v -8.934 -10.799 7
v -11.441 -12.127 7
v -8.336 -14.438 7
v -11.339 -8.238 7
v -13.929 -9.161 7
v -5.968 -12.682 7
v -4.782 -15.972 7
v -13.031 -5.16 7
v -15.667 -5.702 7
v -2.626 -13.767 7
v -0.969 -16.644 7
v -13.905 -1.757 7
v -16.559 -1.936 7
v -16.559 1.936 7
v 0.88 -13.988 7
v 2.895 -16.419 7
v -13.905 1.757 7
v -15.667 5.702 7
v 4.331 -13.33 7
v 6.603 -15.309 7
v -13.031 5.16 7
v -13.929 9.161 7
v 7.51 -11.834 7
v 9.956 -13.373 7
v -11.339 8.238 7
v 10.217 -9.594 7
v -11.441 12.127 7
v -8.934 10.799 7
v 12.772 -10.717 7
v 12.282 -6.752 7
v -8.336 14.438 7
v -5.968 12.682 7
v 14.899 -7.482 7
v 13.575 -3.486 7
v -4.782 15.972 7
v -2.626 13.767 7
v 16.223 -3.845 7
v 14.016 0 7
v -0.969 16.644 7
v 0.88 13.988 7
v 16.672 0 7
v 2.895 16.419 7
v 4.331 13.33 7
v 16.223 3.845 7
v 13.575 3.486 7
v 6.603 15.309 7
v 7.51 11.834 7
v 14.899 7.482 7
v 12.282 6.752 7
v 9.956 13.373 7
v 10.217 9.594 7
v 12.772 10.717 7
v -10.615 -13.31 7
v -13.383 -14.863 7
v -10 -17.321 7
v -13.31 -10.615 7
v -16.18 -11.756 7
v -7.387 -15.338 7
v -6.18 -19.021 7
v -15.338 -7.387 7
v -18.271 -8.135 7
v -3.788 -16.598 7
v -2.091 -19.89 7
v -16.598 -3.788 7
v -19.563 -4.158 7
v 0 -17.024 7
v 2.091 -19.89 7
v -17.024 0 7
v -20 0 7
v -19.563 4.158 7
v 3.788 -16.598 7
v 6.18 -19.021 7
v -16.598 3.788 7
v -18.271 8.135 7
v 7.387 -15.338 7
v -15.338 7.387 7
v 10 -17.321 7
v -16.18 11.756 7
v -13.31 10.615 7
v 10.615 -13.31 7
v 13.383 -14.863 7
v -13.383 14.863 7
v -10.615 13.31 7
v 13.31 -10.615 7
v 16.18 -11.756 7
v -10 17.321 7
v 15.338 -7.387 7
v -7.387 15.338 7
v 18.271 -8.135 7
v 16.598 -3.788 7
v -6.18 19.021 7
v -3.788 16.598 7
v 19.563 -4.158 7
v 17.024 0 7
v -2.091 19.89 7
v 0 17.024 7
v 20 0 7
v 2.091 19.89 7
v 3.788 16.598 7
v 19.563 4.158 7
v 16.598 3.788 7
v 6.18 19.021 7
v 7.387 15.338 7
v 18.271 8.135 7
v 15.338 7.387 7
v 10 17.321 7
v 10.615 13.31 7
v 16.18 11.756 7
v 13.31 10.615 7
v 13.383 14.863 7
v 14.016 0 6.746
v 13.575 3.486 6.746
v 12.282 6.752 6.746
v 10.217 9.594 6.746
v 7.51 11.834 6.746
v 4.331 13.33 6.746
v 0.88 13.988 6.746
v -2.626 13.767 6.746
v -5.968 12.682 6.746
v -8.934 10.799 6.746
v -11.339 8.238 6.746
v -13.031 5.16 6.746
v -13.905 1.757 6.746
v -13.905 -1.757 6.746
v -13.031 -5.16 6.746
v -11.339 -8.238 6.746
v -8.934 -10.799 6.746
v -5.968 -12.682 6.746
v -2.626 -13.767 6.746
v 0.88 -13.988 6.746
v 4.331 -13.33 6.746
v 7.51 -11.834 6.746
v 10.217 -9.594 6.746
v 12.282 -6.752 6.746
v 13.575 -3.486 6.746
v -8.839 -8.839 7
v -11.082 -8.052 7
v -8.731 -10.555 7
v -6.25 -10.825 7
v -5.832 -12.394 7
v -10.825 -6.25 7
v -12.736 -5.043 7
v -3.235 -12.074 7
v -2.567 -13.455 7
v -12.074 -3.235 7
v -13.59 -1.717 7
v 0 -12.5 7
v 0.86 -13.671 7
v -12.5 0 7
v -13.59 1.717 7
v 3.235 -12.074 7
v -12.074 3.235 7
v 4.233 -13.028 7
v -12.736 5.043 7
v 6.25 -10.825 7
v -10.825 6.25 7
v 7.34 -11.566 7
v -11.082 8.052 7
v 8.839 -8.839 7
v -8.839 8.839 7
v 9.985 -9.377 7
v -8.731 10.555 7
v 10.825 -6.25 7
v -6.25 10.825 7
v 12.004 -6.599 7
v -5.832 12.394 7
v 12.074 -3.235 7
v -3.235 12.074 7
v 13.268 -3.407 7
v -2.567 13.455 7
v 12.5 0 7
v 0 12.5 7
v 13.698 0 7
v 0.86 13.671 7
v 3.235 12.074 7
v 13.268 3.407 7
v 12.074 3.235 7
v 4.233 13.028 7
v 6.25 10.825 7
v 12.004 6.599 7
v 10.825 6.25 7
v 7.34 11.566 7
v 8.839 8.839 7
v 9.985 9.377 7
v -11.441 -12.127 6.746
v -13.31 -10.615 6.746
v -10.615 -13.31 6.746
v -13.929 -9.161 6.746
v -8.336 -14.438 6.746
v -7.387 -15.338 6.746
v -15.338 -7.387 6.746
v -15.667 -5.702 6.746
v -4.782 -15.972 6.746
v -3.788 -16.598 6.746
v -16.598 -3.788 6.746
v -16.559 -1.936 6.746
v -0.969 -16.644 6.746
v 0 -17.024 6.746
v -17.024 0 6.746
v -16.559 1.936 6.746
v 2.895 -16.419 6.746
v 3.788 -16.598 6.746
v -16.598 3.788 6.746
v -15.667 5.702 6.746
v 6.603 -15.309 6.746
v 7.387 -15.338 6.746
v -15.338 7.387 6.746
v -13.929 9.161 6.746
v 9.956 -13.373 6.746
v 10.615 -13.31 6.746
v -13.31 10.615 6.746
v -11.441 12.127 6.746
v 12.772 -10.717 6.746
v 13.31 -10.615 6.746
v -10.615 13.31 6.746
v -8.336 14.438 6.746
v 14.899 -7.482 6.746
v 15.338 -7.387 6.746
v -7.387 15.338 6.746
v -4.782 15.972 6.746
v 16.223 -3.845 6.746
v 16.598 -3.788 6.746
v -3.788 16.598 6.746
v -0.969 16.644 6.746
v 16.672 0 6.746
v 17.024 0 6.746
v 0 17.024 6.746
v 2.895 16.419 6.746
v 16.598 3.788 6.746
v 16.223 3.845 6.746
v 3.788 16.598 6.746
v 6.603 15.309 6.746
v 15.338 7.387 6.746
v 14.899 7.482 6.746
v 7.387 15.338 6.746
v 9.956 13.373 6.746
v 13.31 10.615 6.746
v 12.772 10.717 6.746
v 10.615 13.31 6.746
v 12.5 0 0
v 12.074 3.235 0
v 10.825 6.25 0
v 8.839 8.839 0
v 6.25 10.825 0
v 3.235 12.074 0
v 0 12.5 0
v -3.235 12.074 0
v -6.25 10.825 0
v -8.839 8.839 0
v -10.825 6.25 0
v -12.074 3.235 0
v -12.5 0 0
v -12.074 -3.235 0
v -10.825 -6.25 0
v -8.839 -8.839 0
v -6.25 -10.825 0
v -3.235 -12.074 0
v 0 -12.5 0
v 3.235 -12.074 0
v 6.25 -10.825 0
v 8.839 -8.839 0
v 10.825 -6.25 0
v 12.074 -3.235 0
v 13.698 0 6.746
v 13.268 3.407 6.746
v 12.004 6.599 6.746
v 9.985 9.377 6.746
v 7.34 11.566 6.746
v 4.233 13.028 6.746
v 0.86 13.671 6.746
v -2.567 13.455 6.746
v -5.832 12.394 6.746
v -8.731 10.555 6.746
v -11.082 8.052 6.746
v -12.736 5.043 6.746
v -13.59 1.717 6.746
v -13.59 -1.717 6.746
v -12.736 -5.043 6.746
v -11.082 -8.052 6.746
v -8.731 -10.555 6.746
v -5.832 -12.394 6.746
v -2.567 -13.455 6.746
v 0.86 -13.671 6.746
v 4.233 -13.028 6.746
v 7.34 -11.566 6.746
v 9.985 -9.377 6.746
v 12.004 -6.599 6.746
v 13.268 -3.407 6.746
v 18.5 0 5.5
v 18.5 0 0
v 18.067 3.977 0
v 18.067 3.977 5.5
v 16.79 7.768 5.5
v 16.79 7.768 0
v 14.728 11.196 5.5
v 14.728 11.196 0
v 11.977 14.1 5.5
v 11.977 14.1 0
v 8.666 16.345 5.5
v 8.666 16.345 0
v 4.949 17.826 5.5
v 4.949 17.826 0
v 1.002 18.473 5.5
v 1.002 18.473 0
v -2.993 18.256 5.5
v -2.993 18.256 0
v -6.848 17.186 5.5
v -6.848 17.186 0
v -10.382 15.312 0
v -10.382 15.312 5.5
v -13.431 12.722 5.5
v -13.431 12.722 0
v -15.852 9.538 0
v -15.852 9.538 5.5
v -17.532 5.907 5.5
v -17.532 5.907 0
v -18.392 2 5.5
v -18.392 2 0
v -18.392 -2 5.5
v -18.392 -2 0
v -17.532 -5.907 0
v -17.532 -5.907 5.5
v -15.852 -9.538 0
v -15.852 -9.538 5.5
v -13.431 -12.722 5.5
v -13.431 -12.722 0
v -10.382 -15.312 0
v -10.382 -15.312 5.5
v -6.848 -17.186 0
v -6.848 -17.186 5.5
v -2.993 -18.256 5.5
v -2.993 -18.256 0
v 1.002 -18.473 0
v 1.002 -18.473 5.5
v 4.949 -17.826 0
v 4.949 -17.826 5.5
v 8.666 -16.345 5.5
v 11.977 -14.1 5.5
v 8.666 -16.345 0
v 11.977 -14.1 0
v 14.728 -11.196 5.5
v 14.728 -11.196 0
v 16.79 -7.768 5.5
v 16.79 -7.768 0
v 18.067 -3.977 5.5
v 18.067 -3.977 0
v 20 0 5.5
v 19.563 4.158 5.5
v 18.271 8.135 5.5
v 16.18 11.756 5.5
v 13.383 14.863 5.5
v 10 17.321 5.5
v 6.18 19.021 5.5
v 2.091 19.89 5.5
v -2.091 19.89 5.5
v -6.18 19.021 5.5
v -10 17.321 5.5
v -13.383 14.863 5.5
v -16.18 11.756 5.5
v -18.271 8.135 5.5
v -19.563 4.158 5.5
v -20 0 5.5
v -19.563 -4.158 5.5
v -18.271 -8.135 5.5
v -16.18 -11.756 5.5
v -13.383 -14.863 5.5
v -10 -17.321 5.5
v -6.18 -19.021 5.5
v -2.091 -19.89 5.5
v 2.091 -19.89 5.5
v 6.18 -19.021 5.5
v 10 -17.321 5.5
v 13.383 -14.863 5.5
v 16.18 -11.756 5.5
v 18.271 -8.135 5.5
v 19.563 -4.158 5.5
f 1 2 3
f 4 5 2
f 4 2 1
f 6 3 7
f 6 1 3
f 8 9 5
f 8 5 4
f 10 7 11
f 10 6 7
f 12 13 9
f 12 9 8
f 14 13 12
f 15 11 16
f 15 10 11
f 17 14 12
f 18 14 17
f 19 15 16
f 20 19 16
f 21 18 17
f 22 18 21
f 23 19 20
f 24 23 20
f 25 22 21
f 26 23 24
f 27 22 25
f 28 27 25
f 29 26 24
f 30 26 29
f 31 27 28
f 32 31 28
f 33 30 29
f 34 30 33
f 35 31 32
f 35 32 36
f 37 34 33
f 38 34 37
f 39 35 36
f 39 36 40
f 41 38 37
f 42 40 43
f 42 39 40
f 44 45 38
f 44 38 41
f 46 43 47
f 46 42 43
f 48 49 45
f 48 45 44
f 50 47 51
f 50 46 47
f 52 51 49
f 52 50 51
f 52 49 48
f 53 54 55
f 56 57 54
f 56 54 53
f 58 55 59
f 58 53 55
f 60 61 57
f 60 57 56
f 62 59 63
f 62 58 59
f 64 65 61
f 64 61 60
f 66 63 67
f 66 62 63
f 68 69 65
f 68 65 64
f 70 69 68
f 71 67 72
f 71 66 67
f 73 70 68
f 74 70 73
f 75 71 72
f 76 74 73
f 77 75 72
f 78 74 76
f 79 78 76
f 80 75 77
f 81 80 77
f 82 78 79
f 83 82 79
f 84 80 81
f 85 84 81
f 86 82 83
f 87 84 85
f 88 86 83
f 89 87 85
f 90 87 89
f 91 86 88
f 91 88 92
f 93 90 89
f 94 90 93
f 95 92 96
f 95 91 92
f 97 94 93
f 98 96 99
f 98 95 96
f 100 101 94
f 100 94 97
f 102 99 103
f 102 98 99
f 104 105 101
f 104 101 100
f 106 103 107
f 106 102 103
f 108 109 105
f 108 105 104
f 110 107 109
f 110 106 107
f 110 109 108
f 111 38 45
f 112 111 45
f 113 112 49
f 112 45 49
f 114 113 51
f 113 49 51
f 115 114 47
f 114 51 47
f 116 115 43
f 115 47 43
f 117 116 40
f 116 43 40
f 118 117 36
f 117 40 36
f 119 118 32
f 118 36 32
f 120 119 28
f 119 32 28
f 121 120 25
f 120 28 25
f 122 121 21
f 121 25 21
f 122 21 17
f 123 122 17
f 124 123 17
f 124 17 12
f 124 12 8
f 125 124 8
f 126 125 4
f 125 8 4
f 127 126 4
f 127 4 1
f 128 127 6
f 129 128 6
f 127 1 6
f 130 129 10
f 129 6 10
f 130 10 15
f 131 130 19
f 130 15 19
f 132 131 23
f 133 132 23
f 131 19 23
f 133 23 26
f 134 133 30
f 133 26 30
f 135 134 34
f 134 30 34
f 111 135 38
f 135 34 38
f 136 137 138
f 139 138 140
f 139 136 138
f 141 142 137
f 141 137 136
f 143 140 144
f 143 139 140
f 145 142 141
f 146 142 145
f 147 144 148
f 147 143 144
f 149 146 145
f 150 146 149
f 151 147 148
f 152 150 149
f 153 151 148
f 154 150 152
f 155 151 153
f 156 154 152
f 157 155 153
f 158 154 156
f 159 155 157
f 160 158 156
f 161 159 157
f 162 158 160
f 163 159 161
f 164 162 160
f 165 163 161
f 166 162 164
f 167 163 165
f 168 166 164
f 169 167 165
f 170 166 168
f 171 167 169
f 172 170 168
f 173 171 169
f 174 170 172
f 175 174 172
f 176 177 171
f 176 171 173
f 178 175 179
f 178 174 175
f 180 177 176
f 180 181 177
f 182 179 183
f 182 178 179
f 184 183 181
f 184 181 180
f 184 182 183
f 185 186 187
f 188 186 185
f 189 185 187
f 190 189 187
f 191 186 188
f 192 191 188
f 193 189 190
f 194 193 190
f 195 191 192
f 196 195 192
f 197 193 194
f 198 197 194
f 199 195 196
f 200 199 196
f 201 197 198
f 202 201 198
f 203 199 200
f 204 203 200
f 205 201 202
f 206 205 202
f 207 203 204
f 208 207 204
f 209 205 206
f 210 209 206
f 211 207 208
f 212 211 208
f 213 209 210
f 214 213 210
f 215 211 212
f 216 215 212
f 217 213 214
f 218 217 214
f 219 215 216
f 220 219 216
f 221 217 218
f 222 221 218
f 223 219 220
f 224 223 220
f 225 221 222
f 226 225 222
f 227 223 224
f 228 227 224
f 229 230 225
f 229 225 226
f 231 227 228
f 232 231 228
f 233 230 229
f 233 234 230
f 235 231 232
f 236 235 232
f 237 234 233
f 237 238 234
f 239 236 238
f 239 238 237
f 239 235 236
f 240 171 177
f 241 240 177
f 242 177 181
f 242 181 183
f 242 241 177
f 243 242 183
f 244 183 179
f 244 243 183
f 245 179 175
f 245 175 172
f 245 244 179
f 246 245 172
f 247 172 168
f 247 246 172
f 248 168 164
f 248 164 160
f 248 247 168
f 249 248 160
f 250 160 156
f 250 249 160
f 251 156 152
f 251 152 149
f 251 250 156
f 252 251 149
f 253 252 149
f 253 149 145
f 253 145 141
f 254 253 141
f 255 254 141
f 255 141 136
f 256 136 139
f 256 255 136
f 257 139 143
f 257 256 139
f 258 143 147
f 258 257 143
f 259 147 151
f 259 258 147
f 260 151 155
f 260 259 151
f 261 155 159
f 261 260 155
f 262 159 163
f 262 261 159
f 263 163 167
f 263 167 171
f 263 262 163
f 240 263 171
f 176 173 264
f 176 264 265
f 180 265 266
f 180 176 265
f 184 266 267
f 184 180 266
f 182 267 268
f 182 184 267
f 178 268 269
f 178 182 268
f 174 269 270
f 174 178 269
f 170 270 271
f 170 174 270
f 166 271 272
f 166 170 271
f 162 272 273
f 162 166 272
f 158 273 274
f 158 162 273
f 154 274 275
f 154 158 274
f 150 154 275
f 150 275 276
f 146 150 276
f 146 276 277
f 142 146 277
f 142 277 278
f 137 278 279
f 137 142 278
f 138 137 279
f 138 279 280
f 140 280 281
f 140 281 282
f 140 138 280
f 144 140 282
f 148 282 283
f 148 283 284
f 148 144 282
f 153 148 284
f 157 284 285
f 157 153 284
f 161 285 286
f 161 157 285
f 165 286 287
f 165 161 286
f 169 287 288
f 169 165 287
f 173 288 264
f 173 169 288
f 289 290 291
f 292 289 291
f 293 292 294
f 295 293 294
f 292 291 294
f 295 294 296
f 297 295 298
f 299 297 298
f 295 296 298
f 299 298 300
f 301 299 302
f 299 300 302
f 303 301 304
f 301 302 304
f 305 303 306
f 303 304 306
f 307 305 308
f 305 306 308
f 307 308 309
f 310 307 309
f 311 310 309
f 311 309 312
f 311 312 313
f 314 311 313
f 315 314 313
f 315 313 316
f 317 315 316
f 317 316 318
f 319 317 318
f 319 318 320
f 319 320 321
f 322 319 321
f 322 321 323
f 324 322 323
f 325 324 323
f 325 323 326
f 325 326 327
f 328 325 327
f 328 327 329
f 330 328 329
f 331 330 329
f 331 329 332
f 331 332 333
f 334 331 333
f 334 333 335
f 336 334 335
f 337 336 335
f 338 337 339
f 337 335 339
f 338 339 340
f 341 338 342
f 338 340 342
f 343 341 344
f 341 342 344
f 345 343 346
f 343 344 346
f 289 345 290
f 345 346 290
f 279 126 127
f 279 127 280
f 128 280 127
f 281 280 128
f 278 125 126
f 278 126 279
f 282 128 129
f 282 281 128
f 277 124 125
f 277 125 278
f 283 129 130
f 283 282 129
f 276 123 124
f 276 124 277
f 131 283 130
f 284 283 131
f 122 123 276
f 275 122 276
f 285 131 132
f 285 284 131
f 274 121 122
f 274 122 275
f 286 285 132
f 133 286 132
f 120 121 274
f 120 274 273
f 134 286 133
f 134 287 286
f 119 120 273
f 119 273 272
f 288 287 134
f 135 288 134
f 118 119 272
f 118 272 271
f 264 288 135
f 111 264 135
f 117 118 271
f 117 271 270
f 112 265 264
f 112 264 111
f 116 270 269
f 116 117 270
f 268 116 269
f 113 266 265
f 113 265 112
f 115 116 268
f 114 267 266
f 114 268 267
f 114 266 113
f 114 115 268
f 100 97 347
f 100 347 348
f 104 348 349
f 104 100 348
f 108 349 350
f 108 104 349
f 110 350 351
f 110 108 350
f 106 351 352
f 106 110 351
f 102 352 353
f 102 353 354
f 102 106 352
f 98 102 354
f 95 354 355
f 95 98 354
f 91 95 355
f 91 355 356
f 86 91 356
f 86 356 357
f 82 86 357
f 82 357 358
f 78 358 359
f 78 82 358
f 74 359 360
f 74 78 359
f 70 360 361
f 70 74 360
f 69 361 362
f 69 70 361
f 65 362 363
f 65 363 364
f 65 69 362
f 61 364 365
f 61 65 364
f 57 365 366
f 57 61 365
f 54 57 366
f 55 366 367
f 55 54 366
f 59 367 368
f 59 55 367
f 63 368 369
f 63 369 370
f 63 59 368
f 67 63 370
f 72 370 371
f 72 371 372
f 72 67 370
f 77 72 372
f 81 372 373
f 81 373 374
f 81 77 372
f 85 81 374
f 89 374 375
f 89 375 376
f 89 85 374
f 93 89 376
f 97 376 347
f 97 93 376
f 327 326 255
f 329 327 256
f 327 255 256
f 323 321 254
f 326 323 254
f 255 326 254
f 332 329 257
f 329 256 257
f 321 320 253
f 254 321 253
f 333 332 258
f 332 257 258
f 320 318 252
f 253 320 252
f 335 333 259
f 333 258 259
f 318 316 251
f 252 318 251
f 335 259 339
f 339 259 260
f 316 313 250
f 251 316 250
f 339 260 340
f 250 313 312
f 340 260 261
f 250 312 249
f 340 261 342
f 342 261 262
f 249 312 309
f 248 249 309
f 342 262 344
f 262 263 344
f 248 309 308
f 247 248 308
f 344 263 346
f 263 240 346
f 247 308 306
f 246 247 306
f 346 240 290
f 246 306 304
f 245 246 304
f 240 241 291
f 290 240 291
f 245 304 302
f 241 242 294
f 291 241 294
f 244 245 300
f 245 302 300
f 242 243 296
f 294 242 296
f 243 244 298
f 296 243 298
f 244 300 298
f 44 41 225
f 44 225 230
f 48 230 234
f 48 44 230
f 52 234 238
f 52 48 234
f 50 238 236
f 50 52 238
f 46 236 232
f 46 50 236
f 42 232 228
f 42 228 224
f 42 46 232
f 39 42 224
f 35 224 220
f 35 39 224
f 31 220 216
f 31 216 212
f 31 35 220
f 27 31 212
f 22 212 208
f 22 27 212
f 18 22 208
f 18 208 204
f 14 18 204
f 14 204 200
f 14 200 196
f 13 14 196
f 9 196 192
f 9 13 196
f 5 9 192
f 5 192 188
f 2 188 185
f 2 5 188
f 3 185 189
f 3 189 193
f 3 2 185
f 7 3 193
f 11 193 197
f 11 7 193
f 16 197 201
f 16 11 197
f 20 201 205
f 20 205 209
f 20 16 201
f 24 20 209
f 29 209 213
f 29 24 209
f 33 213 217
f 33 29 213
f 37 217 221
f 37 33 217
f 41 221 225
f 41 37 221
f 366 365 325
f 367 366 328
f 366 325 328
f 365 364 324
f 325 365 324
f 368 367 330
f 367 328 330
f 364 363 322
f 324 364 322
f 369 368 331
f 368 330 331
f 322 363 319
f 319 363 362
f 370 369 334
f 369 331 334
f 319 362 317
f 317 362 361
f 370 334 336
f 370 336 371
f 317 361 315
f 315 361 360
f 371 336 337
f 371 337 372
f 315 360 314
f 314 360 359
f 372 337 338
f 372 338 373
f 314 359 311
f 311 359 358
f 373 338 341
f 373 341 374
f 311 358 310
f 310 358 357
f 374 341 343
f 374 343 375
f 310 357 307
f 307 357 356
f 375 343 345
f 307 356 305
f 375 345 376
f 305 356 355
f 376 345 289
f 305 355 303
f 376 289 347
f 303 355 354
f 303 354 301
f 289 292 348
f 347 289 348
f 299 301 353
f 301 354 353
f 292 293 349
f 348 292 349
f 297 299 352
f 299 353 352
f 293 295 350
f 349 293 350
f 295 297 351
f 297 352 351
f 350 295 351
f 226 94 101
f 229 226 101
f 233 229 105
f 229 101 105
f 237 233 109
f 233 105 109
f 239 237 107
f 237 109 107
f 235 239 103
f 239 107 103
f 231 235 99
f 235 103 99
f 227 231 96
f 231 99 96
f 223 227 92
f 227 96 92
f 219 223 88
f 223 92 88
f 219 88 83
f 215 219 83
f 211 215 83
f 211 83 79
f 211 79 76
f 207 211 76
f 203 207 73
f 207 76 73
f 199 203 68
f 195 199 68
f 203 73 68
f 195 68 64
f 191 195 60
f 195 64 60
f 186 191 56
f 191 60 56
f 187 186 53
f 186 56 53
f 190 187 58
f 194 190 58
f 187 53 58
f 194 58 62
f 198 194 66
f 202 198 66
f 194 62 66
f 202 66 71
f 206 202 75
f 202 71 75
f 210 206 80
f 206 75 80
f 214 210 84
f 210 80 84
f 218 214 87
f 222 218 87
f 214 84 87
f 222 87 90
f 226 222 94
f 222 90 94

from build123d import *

# Parameters (mm, degrees)
F0_R     = 18.5
F0_R_2   = 12.5
F1_DEPTH = 7
F2_R     = 14.015719
F2_R_2   = 13.698062
F3_DEPTH = 0.254
F4_R     = 17.024352
F4_R_2   = 16.672097
F5_DEPTH = 0.254
F6_R     = 20
F6_R_2   = 18.5
F7_DEPTH = 1.5


with BuildPart() as f1:
    # F0 (on Top) → F1 (new body)
    with BuildSketch(Plane.XY):
        Circle(F0_R)
        Circle(F0_R_2, mode=Mode.SUBTRACT)
    extrude(amount=F1_DEPTH)

    # F2 (on face) → F3 (cut)
    with BuildSketch(Plane.XY.offset(7)):
        Circle(F2_R)
        Circle(F2_R_2, mode=Mode.SUBTRACT)
    extrude(amount=-F3_DEPTH, mode=Mode.SUBTRACT)

    # F4 (on face) → F5 (cut)
    with BuildSketch(Plane.XY.offset(7)):
        Circle(F4_R)
        Circle(F4_R_2, mode=Mode.SUBTRACT)
    extrude(amount=-F5_DEPTH, mode=Mode.SUBTRACT)

    # F6 (on face) → F7 (join)
    with BuildSketch(Plane.XY.offset(7)):
        Circle(F6_R)
        Circle(F6_R_2, mode=Mode.SUBTRACT)
    extrude(amount=-F7_DEPTH)


solid = f1.part
